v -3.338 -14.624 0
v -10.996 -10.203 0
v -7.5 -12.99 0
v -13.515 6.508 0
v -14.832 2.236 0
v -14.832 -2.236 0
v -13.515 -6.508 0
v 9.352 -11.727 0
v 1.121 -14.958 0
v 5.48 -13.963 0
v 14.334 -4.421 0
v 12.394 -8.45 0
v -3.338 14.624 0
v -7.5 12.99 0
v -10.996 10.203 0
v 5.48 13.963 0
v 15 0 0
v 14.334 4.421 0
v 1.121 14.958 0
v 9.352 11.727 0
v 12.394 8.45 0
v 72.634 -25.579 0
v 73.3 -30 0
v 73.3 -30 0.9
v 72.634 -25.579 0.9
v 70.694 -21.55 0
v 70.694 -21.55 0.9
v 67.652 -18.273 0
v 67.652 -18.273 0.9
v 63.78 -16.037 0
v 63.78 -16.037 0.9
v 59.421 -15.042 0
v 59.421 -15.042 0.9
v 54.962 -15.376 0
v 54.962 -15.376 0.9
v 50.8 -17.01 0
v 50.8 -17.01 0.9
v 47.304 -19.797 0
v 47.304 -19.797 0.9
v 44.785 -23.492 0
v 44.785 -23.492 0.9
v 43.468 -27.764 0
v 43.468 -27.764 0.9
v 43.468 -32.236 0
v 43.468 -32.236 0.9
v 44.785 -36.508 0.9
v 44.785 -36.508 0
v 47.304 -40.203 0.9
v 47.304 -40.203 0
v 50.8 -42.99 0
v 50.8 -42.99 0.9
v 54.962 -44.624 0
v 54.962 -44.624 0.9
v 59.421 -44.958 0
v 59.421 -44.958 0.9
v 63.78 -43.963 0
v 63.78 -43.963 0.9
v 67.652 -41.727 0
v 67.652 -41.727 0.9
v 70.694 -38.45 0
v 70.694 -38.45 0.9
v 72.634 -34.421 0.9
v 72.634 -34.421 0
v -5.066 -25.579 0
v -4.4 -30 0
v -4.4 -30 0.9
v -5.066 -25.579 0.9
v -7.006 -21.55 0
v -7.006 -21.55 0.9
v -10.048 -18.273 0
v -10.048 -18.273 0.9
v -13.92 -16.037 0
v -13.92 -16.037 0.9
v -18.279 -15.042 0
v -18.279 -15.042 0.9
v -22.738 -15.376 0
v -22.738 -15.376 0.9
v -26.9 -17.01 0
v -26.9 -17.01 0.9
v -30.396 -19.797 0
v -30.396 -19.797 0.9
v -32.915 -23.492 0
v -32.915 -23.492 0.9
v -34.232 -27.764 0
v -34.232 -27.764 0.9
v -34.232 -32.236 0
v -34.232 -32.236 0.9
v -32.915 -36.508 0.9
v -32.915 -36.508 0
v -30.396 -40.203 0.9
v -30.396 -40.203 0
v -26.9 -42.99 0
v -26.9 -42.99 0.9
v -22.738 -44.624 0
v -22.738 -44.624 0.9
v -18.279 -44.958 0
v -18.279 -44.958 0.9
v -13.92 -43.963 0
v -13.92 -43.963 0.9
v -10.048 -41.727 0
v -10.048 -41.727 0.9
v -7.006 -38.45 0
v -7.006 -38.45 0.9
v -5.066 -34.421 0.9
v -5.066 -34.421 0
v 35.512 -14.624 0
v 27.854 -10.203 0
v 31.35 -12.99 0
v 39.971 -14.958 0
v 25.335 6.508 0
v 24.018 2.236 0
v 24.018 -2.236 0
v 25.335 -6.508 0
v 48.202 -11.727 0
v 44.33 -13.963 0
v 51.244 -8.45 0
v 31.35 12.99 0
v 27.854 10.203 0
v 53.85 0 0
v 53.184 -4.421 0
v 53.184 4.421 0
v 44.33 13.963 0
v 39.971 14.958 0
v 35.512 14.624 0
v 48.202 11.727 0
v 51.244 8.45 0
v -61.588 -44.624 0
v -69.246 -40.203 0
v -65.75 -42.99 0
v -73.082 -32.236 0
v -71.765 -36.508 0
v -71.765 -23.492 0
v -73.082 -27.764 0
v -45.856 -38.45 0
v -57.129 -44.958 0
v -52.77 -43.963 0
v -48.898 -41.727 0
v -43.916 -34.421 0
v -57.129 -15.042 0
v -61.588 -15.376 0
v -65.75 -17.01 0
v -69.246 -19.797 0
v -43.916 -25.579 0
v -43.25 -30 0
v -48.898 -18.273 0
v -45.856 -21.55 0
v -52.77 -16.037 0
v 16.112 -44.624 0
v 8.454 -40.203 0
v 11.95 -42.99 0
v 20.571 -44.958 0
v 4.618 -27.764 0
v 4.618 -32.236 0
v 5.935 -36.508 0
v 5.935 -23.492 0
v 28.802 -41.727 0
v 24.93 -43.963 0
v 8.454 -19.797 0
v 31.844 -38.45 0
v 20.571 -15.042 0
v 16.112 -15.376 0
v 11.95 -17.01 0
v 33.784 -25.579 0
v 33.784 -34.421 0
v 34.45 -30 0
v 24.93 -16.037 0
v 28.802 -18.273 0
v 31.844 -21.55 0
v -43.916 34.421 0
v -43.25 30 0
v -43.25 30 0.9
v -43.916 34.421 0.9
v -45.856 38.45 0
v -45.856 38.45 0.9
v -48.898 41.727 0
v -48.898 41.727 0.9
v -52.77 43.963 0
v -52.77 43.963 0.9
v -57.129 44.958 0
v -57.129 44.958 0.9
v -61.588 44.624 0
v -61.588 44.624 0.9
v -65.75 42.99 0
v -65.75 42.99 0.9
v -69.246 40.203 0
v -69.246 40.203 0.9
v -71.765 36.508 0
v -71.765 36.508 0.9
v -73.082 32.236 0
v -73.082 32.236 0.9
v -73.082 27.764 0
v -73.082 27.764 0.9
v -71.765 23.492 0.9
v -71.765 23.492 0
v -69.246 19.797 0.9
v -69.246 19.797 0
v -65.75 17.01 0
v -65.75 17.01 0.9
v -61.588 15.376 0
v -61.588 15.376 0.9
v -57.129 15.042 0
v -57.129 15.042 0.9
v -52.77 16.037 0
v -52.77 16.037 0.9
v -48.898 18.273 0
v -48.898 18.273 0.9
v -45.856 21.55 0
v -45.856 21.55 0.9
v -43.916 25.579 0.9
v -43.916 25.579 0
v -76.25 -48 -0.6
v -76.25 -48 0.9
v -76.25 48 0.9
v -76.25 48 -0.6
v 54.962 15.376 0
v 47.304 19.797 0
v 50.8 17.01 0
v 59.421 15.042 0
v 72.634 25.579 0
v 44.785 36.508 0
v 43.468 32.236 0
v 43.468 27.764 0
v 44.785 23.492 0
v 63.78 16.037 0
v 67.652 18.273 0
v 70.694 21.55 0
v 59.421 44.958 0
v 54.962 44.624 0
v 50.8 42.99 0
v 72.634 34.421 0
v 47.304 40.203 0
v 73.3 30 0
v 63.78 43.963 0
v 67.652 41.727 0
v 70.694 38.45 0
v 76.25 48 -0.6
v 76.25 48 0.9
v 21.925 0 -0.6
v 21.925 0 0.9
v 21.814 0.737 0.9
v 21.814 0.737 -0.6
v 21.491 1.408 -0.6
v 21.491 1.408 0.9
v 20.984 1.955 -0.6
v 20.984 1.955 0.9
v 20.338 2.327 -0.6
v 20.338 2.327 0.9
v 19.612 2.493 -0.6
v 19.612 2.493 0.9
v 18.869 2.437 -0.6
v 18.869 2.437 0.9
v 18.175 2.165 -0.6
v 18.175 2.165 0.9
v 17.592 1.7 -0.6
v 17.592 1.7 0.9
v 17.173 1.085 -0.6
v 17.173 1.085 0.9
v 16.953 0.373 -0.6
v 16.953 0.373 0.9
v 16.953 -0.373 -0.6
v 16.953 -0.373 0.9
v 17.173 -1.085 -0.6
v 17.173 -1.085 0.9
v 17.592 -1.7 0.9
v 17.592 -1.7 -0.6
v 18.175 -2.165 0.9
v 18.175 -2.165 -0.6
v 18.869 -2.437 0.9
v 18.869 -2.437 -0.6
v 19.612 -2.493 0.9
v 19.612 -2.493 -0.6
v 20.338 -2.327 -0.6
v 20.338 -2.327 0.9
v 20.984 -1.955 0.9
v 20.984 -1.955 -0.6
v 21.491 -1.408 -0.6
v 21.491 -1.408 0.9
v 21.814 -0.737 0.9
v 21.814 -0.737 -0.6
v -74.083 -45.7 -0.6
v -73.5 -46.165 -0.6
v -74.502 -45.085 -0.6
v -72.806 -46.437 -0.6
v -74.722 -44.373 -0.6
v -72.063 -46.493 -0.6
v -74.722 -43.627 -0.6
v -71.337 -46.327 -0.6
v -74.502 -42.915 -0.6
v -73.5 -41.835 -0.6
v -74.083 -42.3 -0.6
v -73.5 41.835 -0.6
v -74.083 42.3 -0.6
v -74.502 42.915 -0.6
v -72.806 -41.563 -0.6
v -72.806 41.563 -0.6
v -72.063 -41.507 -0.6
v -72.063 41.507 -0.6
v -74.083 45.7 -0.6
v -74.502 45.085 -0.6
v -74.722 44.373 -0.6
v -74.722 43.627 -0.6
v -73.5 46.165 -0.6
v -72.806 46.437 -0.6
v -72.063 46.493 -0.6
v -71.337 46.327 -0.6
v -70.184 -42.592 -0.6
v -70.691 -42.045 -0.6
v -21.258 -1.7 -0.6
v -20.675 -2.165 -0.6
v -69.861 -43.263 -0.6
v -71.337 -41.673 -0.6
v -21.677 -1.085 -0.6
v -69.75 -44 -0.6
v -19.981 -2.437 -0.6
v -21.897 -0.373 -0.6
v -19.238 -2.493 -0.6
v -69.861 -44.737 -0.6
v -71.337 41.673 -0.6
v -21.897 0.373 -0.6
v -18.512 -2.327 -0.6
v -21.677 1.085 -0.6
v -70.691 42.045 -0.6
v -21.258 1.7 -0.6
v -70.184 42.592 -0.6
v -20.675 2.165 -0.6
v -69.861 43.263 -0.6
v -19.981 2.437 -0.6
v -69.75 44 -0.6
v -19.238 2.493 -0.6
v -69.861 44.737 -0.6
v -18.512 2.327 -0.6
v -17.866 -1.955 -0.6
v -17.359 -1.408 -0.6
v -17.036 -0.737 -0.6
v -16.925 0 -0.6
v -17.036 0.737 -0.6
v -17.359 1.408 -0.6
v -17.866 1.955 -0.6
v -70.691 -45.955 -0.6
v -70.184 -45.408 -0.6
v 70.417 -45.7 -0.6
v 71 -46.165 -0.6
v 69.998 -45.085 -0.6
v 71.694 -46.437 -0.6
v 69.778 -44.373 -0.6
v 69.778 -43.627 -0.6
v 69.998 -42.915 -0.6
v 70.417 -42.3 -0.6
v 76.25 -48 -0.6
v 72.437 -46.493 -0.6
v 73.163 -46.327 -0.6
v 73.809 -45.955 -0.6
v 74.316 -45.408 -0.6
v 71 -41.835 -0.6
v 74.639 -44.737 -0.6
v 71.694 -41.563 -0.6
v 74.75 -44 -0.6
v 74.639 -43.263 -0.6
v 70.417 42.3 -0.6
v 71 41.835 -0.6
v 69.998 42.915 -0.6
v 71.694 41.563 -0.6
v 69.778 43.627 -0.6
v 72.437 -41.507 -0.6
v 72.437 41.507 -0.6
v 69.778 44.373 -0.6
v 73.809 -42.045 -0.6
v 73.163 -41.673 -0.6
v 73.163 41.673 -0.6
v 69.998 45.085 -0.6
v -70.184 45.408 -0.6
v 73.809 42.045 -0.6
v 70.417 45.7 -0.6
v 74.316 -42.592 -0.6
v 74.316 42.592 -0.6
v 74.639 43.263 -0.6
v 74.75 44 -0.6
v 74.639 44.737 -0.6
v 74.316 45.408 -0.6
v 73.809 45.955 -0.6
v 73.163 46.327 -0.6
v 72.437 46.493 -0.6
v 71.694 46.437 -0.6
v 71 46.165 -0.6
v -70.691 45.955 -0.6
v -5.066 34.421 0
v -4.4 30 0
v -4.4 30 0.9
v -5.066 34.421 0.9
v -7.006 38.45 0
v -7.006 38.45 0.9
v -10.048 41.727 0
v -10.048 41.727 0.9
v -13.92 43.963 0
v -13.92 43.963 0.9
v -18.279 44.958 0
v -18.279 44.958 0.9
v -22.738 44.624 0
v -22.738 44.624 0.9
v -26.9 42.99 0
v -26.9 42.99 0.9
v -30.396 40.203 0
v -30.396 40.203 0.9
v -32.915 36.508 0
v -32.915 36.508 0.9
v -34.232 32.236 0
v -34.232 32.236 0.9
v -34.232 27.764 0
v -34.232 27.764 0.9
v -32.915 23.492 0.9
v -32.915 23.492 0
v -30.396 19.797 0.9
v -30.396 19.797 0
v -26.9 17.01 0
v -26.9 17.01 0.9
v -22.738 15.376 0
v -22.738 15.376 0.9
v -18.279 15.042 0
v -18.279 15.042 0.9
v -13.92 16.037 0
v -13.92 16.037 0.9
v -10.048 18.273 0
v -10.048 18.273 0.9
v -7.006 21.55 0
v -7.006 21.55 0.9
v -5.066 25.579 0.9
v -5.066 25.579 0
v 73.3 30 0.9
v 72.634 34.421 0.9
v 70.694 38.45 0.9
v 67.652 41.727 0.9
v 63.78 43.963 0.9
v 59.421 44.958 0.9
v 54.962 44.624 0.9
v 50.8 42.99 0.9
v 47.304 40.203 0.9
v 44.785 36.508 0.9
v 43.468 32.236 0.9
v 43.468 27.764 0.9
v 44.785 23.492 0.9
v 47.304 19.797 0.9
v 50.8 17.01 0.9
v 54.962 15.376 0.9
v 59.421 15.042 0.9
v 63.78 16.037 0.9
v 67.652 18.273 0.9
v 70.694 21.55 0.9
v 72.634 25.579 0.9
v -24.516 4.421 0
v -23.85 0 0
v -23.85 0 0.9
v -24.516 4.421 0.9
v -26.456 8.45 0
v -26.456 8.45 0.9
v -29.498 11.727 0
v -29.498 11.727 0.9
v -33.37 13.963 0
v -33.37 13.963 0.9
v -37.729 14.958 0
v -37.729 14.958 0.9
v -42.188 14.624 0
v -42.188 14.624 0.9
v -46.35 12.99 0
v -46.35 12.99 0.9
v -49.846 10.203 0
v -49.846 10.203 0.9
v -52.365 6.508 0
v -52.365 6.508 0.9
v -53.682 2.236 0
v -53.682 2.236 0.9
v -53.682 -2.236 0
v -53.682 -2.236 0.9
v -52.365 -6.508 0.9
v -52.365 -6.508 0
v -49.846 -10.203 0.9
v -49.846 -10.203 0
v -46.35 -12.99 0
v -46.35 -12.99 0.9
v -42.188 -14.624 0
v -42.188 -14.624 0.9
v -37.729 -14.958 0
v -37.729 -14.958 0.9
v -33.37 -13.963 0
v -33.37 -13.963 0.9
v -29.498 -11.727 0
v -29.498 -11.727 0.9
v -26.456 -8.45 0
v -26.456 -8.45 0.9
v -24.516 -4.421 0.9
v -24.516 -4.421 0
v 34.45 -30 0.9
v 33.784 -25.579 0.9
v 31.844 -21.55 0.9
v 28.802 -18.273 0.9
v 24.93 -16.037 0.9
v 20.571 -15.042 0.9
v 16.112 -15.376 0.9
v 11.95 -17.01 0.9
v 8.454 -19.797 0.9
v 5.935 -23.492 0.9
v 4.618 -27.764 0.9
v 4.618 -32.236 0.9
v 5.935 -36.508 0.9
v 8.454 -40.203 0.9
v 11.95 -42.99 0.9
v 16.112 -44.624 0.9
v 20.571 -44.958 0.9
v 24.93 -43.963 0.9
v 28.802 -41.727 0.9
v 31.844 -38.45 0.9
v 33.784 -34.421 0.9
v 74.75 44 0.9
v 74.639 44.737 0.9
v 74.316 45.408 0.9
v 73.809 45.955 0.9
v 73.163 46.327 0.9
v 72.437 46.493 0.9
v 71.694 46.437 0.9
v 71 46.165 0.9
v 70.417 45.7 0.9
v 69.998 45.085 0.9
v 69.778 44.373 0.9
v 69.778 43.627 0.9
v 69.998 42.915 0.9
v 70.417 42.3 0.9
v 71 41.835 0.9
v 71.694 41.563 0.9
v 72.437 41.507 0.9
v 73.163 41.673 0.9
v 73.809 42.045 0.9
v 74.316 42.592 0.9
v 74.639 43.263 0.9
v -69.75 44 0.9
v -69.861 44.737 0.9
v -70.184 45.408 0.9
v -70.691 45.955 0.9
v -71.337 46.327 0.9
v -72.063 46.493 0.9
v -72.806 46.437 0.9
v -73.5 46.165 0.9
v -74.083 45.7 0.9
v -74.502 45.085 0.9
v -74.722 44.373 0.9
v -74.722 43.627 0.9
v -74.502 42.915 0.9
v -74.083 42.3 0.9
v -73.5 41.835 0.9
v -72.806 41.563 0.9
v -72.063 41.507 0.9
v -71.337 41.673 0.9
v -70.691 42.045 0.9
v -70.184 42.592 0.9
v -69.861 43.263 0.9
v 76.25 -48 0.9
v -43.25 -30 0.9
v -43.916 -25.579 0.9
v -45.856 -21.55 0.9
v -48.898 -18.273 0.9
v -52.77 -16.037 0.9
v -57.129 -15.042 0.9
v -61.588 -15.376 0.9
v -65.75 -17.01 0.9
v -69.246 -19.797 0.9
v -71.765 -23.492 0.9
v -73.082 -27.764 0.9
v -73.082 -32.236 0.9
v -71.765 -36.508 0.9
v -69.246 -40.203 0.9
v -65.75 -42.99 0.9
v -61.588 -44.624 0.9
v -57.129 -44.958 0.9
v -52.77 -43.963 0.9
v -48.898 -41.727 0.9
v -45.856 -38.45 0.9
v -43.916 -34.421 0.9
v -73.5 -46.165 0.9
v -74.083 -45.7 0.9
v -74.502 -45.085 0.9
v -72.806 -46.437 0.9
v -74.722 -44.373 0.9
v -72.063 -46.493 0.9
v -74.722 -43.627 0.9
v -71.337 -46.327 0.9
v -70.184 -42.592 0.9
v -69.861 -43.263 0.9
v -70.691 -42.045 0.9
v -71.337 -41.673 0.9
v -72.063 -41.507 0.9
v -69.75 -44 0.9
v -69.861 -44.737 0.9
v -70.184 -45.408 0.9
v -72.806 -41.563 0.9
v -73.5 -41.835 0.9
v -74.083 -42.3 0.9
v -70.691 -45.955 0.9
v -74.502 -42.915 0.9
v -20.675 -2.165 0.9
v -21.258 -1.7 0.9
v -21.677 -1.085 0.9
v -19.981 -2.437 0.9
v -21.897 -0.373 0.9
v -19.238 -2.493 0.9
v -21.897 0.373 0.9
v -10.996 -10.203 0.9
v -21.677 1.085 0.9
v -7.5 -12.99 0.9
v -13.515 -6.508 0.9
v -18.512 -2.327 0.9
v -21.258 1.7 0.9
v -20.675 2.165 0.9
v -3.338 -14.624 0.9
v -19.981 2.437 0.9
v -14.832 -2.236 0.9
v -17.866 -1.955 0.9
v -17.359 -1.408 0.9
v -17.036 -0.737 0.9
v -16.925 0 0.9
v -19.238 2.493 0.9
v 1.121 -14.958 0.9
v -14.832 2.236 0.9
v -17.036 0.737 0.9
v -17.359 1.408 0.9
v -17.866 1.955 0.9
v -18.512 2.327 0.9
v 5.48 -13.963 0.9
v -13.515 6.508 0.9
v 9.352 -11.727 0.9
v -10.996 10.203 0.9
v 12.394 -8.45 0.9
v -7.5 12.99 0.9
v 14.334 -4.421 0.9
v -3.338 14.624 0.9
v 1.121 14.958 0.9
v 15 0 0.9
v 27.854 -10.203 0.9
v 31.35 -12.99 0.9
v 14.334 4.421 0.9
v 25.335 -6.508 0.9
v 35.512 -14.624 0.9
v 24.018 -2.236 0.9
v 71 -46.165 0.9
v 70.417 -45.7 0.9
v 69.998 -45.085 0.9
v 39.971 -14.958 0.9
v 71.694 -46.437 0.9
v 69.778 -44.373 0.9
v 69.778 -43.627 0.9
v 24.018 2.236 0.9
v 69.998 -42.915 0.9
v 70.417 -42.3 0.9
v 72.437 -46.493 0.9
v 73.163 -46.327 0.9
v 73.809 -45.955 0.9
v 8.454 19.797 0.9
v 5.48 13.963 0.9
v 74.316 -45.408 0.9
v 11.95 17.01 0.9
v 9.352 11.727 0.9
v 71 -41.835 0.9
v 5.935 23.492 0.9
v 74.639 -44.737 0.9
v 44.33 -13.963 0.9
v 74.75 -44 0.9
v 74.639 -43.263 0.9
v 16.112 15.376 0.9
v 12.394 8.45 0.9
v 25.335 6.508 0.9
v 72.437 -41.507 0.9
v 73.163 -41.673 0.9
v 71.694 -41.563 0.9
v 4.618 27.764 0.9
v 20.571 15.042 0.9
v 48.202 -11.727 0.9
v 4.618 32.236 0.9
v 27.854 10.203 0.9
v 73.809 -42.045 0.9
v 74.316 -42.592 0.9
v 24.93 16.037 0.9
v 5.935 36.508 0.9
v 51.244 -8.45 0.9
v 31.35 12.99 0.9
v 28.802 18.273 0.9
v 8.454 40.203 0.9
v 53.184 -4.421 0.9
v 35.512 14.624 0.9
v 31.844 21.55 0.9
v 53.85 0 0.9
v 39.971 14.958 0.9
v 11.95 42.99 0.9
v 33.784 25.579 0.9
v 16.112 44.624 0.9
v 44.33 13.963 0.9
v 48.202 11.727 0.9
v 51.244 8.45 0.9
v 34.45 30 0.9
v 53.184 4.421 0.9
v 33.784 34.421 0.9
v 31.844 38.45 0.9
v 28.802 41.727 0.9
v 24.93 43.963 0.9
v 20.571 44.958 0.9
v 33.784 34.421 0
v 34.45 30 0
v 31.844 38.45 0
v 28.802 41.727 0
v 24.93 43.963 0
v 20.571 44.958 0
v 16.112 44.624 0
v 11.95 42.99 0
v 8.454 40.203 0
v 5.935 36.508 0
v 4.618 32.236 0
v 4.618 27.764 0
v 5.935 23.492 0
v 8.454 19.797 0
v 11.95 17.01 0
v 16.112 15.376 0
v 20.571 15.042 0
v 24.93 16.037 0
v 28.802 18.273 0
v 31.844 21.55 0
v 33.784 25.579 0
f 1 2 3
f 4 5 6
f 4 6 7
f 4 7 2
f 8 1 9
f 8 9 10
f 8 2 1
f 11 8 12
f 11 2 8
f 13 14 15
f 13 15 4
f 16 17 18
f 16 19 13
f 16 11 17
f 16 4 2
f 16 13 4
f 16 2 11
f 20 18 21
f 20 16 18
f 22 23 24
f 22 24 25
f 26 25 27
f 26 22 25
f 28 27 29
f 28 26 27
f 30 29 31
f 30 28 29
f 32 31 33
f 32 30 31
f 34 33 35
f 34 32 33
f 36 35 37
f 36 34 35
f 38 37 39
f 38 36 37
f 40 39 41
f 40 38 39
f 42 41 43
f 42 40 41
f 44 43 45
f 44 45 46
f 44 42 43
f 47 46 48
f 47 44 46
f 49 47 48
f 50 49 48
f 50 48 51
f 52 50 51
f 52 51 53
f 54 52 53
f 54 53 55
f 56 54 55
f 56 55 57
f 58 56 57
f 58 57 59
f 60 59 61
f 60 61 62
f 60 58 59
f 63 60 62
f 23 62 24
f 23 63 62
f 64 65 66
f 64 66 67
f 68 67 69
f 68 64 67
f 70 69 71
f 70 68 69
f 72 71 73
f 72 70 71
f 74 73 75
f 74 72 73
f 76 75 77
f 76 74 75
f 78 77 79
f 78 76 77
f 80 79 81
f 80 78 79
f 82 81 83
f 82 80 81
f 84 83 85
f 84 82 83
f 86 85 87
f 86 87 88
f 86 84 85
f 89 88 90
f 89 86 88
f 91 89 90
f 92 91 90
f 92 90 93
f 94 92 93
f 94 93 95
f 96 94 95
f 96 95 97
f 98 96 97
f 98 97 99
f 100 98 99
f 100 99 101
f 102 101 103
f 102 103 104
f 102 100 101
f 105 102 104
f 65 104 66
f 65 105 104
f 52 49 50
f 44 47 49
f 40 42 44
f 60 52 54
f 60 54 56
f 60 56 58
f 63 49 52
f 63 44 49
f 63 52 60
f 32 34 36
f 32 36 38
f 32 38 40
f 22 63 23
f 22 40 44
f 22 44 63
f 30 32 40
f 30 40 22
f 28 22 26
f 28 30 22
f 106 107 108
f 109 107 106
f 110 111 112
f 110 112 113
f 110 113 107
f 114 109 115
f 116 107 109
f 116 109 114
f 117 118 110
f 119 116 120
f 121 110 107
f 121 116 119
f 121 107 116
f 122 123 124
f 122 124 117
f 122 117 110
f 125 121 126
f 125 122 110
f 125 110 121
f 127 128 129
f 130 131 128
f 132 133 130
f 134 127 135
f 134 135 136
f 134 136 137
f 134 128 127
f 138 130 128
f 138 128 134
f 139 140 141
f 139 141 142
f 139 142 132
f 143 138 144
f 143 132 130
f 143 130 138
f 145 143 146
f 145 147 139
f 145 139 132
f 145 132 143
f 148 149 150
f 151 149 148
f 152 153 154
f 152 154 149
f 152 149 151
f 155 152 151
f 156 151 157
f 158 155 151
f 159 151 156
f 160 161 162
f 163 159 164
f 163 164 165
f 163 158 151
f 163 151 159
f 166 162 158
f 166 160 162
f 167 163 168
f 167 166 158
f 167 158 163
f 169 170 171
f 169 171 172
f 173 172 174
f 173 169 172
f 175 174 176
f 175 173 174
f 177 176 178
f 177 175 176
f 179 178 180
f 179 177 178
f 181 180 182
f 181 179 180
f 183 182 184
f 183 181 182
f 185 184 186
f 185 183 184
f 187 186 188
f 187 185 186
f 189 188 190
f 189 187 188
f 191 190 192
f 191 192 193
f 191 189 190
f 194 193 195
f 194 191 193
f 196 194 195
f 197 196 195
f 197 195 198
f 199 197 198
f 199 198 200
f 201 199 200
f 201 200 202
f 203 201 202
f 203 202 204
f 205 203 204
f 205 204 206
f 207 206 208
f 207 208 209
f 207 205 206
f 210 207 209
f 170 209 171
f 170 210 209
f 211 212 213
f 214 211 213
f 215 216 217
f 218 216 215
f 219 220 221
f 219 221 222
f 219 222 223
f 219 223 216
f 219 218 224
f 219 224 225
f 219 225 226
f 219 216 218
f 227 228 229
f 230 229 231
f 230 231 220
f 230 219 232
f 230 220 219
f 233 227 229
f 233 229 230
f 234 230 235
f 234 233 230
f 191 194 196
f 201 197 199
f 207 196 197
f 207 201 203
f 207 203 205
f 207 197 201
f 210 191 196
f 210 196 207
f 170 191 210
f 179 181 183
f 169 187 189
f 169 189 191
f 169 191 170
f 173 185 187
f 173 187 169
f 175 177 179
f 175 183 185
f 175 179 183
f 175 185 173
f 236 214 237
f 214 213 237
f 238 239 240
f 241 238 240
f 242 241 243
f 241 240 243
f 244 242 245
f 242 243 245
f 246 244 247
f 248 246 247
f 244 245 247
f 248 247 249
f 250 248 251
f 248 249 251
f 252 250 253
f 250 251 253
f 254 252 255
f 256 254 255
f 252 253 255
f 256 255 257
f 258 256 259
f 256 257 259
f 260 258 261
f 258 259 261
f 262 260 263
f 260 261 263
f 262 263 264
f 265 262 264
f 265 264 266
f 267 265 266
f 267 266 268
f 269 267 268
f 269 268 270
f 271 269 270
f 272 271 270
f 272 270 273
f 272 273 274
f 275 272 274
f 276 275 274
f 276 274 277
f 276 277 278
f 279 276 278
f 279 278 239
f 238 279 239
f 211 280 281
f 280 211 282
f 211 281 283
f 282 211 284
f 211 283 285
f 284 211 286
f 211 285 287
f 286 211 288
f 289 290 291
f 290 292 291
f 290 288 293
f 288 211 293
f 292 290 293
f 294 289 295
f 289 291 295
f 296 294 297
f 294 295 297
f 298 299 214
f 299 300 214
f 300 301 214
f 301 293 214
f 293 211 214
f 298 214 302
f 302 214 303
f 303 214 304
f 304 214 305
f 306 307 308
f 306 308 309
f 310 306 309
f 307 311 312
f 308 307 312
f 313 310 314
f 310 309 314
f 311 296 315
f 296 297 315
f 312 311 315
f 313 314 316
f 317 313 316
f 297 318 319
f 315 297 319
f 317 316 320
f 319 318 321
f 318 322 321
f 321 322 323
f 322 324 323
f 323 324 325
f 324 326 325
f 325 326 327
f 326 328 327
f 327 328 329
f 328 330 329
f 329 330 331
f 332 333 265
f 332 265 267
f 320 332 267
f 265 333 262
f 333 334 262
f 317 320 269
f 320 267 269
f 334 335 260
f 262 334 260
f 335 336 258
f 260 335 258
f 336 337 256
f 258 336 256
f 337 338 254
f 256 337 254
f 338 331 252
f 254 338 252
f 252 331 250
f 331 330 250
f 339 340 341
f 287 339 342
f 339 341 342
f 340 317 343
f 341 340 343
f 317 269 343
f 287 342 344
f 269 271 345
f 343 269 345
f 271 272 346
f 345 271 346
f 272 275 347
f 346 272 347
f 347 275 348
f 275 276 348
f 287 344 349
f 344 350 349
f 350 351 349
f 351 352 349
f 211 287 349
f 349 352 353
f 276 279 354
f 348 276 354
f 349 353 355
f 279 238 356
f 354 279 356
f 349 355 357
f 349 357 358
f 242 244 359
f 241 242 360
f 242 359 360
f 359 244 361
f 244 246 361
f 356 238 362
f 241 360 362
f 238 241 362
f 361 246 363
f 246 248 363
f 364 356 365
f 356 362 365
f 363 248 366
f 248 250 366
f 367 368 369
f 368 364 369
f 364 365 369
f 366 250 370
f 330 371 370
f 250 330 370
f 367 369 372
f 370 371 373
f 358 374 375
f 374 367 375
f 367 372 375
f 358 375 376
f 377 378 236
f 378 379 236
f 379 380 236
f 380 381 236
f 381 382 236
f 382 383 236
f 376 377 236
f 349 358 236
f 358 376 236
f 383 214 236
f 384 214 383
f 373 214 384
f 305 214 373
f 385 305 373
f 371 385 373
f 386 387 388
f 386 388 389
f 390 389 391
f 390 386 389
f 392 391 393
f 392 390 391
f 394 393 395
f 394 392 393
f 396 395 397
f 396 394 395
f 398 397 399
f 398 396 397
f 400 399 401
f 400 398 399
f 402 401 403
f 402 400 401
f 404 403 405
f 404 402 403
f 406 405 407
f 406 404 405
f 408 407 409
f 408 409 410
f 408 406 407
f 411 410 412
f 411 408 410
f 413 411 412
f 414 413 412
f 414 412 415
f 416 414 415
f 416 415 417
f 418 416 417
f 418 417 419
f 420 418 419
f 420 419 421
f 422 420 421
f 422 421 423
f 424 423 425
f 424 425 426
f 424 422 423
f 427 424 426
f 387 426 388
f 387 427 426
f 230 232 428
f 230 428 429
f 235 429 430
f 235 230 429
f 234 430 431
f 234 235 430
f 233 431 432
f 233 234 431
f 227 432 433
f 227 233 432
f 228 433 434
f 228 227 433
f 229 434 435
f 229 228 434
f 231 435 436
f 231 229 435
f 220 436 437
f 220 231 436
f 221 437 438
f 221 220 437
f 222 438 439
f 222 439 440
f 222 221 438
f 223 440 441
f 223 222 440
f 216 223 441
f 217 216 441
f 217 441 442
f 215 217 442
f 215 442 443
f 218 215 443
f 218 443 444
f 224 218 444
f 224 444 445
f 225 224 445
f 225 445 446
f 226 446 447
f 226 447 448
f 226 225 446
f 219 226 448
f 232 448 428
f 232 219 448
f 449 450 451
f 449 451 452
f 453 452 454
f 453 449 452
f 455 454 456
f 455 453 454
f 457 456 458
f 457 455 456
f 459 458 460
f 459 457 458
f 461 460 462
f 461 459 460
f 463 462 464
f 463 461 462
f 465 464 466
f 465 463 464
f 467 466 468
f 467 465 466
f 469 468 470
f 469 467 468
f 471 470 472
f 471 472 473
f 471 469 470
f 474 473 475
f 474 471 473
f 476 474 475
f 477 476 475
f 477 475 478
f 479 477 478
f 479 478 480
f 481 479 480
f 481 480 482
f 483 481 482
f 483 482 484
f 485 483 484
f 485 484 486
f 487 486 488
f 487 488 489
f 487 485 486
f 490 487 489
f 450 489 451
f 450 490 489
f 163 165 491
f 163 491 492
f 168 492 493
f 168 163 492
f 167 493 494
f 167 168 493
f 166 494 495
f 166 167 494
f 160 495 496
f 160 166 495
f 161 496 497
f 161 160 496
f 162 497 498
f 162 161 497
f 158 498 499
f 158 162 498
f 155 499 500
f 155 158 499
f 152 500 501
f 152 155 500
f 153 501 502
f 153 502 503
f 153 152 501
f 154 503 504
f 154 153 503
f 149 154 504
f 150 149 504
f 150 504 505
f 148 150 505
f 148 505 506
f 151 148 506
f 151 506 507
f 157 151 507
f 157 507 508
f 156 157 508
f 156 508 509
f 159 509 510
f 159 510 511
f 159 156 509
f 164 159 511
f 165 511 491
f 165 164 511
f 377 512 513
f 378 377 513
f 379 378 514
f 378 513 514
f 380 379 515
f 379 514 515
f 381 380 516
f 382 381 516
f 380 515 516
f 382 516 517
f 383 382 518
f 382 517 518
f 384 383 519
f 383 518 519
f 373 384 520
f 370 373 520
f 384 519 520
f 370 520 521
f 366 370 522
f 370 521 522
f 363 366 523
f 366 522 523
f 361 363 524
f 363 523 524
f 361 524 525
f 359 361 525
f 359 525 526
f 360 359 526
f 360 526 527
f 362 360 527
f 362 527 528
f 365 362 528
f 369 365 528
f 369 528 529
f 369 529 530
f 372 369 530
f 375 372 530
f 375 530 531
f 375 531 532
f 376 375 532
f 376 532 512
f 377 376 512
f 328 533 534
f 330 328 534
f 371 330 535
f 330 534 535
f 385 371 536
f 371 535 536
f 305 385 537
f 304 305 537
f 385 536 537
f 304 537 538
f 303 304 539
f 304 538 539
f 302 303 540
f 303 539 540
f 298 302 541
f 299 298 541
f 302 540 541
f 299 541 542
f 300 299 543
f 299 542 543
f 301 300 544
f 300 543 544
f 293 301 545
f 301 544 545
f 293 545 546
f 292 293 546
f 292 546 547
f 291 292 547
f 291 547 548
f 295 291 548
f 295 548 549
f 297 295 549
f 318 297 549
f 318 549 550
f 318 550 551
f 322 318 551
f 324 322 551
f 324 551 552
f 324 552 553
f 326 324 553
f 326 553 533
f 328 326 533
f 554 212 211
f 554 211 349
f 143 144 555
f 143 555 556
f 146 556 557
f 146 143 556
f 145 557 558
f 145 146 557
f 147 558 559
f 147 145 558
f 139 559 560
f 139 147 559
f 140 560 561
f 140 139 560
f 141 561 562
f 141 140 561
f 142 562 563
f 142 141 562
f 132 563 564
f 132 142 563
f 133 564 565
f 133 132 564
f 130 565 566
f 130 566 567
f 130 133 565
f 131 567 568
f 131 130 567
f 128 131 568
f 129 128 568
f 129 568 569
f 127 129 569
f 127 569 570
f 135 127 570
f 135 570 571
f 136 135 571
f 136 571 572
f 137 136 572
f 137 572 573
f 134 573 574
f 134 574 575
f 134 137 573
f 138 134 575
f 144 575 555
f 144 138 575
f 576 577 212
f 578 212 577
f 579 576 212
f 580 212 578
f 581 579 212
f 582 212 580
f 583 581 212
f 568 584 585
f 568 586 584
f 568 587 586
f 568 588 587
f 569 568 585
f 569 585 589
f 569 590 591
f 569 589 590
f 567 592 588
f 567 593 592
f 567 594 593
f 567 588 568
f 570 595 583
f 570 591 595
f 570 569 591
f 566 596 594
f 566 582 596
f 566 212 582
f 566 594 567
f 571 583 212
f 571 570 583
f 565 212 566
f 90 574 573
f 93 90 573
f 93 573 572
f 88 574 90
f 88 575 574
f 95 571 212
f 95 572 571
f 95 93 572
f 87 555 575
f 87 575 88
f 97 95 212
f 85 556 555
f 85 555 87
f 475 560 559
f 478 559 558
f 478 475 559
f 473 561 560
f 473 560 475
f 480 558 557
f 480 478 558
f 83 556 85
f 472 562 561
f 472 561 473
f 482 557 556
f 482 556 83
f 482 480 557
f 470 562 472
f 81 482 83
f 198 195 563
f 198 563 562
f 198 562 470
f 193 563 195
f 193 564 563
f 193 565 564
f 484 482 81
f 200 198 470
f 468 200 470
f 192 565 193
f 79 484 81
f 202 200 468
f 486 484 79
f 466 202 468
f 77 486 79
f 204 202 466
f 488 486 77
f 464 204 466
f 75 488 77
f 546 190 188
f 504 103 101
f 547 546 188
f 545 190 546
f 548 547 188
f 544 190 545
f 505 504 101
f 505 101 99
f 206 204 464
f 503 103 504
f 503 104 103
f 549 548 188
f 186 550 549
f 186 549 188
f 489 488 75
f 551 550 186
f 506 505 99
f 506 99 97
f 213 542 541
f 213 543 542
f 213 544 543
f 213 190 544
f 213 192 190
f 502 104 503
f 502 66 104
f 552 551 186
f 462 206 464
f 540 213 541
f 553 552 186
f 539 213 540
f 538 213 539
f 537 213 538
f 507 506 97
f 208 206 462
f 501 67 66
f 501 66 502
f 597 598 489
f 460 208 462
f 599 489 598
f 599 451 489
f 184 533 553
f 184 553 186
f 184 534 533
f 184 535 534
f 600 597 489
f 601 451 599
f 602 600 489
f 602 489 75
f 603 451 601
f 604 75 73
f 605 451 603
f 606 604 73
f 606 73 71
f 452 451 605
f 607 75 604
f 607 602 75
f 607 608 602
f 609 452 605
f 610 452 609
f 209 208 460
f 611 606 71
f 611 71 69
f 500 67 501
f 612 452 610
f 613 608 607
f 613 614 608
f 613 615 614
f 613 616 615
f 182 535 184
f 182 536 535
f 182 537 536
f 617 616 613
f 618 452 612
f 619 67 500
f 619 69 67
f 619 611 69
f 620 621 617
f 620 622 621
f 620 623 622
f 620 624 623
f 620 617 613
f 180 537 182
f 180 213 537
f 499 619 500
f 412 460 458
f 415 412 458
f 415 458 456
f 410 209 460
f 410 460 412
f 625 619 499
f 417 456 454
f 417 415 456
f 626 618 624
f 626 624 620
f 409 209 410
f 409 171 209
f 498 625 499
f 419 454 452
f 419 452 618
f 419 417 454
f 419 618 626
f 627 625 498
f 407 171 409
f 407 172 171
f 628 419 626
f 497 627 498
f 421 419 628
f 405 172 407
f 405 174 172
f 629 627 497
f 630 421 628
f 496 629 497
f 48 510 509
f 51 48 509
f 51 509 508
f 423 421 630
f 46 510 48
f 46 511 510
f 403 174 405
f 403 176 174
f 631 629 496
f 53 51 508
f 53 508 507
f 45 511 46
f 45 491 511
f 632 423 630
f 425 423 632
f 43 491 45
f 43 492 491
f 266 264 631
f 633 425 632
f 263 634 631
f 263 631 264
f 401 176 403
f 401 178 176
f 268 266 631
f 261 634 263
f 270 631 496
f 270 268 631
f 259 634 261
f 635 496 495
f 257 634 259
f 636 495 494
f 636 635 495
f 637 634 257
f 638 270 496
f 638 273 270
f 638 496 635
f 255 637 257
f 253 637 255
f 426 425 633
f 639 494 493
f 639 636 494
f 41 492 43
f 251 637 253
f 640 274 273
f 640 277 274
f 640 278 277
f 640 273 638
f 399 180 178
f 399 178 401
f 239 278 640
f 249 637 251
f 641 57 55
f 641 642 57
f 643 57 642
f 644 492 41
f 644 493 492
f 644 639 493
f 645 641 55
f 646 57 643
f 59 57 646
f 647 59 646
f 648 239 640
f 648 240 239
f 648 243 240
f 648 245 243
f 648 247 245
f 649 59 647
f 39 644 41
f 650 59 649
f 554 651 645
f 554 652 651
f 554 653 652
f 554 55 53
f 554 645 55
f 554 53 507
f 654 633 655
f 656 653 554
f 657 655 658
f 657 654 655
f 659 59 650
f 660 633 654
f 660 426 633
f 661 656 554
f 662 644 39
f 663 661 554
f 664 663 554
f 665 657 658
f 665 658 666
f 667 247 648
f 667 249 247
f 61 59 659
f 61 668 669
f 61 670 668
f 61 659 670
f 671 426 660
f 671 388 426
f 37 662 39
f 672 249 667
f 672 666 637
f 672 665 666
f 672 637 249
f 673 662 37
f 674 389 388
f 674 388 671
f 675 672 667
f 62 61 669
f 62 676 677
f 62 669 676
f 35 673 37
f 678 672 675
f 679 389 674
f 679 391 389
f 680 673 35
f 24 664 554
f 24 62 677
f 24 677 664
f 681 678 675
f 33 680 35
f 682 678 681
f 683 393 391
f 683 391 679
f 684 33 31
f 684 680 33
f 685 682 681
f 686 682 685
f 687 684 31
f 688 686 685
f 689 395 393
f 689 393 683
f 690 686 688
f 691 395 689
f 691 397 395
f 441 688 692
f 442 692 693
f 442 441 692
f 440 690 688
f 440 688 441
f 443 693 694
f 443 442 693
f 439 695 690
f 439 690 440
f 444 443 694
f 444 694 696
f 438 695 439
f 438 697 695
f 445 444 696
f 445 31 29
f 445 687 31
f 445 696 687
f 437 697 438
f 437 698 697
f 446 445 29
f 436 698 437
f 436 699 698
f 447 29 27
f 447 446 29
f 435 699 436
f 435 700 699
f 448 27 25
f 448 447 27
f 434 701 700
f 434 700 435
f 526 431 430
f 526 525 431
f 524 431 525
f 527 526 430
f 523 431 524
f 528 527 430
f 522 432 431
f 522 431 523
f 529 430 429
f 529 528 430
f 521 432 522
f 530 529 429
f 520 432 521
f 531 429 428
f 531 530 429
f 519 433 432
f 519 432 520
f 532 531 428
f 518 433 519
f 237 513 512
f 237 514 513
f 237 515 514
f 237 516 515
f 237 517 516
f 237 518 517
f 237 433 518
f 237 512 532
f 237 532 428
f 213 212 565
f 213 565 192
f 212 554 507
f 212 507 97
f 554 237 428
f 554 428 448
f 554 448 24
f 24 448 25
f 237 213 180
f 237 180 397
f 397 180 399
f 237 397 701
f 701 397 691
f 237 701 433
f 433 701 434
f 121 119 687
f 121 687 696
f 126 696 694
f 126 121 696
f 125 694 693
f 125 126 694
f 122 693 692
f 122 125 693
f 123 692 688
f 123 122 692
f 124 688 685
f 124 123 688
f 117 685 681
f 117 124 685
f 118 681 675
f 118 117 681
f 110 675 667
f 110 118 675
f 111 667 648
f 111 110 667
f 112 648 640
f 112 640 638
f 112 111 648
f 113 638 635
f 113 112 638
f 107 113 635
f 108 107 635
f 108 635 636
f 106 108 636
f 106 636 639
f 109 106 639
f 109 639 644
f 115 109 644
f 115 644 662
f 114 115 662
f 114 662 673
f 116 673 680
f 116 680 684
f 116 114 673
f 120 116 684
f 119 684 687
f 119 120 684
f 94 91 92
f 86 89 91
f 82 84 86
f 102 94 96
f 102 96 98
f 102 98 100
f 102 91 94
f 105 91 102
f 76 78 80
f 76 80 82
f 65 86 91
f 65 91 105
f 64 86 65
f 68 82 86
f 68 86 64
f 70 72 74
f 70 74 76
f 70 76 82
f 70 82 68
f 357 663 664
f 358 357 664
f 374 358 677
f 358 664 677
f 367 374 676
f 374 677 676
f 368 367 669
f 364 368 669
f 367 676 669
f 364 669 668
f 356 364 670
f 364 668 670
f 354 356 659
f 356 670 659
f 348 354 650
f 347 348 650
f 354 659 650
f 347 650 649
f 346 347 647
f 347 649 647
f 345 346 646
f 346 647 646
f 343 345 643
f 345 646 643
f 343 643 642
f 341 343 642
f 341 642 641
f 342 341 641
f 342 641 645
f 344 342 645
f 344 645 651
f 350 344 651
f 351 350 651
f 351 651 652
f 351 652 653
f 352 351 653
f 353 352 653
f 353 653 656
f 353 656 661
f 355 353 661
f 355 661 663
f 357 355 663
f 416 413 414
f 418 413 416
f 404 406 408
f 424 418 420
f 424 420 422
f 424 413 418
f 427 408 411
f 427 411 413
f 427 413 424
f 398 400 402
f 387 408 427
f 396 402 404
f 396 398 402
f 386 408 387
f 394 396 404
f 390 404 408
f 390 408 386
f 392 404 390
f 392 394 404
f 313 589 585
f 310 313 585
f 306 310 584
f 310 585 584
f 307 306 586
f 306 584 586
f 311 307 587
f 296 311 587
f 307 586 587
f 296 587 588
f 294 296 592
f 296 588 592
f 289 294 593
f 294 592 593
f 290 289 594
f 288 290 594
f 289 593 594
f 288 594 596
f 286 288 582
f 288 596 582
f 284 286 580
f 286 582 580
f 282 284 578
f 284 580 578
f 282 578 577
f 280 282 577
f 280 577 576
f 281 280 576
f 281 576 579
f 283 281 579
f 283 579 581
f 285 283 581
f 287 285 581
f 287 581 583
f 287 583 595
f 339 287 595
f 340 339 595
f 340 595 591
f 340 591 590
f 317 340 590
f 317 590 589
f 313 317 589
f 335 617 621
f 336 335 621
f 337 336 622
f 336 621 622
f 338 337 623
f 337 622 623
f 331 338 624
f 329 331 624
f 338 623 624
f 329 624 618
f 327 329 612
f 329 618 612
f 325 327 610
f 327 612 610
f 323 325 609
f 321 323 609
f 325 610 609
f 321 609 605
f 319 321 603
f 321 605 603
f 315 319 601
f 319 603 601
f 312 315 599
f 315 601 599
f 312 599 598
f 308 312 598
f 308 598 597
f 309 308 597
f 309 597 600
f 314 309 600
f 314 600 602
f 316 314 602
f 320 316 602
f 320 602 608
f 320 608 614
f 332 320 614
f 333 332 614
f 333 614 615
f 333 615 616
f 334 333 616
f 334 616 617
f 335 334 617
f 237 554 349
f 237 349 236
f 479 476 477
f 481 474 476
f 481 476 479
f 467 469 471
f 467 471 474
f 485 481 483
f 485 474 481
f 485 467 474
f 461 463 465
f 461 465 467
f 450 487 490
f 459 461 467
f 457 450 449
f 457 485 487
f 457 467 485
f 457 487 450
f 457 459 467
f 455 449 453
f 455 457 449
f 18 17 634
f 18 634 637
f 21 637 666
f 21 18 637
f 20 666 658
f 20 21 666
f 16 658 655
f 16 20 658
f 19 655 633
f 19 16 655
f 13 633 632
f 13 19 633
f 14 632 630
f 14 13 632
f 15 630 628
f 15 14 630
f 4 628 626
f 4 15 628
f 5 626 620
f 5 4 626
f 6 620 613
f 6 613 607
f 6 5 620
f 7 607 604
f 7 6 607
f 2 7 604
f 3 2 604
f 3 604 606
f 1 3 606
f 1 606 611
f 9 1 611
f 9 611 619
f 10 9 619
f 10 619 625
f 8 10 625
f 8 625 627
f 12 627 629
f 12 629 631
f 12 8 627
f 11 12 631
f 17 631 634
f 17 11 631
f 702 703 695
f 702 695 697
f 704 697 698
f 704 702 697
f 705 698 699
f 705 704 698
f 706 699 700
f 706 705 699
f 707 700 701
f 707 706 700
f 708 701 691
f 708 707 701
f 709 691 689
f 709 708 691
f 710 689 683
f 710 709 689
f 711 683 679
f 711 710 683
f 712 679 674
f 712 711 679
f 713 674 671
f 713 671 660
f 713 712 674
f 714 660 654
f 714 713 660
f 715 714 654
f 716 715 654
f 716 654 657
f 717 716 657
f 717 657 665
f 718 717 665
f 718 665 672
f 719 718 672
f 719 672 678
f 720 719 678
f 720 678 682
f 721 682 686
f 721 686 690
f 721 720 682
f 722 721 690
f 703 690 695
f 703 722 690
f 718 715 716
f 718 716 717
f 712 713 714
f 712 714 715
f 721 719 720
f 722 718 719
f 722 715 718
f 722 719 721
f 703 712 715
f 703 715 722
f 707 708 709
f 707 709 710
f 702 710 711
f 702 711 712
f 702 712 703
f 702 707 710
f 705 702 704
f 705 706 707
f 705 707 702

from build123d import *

# Parameters (mm, degrees)
F0_W     = 152.5
F0_H     = 96
F0_R     = 15
F1_DEPTH = 0.9
F2_DEPTH = 0.6
F3_R     = 2.5
F4_DEPTH = 1.501


# Not quite as in the source:
# - a feature names something its author has since deleted; it is built from what else it names


with BuildPart() as f1:
    # F0 (on Top) → F1 (new body)
    with BuildSketch(Plane.XY):
        Rectangle(F0_W, F0_H)
        with Locations((-58.25, -30)):
            Circle(F0_R, mode=Mode.SUBTRACT)
        with Locations((-19.4, -30)):
            Circle(F0_R, mode=Mode.SUBTRACT)
        with Locations((19.45, -30)):
            Circle(F0_R, mode=Mode.SUBTRACT)
        with Locations((58.3, -30)):
            Circle(F0_R, mode=Mode.SUBTRACT)
        with Locations((-38.85, 0)):
            Circle(F0_R, mode=Mode.SUBTRACT)
        with Locations((-58.25, 30)):
            Circle(F0_R, mode=Mode.SUBTRACT)
        with Locations((-19.4, 30)):
            Circle(F0_R, mode=Mode.SUBTRACT)
        Circle(F0_R, mode=Mode.SUBTRACT)
        with Locations((38.85, 0)):
            Circle(F0_R, mode=Mode.SUBTRACT)
        with Locations((19.45, 30)):
            Circle(F0_R, mode=Mode.SUBTRACT)
        with Locations((58.3, 30)):
            Circle(F0_R, mode=Mode.SUBTRACT)
    extrude(amount=F1_DEPTH)

    # F0 (on Top) → F2 (join)
    with BuildSketch(Plane.XY):
        Rectangle(F0_W, F0_H)
        with Locations((-58.25, -30)):
            Circle(F0_R, mode=Mode.SUBTRACT)
        with Locations((-19.4, -30)):
            Circle(F0_R, mode=Mode.SUBTRACT)
        with Locations((19.45, -30)):
            Circle(F0_R, mode=Mode.SUBTRACT)
        with Locations((58.3, -30)):
            Circle(F0_R, mode=Mode.SUBTRACT)
        with Locations((-38.85, 0)):
            Circle(F0_R, mode=Mode.SUBTRACT)
        with Locations((-58.25, 30)):
            Circle(F0_R, mode=Mode.SUBTRACT)
        with Locations((-19.4, 30)):
            Circle(F0_R, mode=Mode.SUBTRACT)
        Circle(F0_R, mode=Mode.SUBTRACT)
        with Locations((38.85, 0)):
            Circle(F0_R, mode=Mode.SUBTRACT)
        with Locations((19.45, 30)):
            Circle(F0_R, mode=Mode.SUBTRACT)
        with Locations((58.3, 30)):
            Circle(F0_R, mode=Mode.SUBTRACT)
        with Locations((-58.25, -30)):
            Circle(F0_R)
        with Locations((-38.85, 0)):
            Circle(F0_R)
        with Locations((-58.25, 30)):
            Circle(F0_R)
        with Locations((-19.4, 30)):
            Circle(F0_R)
        with Locations((19.45, 30)):
            Circle(F0_R)
        Circle(F0_R)
        with Locations((38.85, 0)):
            Circle(F0_R)
        with Locations((19.45, -30)):
            Circle(F0_R)
        with Locations((58.3, -30)):
            Circle(F0_R)
        with Locations((58.3, 30)):
            Circle(F0_R)
        with Locations((-19.4, -30)):
            Circle(F0_R)
    extrude(amount=-F2_DEPTH)

    # F3 (on face) → F4 (cut, through all)
    with BuildSketch(Plane.XY.offset(0.9)):
        with Locations((-72.25, 44)):
            Circle(F3_R)
        with Locations((72.25, 44)):
            Circle(F3_R)
        with Locations((-72.25, -44)):
            Circle(F3_R)
        with Locations((72.25, -44)):
            Circle(F3_R)
        with Locations((-19.425, 0)):
            Circle(F3_R)
        with Locations((19.425, 0)):
            Circle(F3_R)
    extrude(amount=-F4_DEPTH, mode=Mode.SUBTRACT)


solid = f1.part
